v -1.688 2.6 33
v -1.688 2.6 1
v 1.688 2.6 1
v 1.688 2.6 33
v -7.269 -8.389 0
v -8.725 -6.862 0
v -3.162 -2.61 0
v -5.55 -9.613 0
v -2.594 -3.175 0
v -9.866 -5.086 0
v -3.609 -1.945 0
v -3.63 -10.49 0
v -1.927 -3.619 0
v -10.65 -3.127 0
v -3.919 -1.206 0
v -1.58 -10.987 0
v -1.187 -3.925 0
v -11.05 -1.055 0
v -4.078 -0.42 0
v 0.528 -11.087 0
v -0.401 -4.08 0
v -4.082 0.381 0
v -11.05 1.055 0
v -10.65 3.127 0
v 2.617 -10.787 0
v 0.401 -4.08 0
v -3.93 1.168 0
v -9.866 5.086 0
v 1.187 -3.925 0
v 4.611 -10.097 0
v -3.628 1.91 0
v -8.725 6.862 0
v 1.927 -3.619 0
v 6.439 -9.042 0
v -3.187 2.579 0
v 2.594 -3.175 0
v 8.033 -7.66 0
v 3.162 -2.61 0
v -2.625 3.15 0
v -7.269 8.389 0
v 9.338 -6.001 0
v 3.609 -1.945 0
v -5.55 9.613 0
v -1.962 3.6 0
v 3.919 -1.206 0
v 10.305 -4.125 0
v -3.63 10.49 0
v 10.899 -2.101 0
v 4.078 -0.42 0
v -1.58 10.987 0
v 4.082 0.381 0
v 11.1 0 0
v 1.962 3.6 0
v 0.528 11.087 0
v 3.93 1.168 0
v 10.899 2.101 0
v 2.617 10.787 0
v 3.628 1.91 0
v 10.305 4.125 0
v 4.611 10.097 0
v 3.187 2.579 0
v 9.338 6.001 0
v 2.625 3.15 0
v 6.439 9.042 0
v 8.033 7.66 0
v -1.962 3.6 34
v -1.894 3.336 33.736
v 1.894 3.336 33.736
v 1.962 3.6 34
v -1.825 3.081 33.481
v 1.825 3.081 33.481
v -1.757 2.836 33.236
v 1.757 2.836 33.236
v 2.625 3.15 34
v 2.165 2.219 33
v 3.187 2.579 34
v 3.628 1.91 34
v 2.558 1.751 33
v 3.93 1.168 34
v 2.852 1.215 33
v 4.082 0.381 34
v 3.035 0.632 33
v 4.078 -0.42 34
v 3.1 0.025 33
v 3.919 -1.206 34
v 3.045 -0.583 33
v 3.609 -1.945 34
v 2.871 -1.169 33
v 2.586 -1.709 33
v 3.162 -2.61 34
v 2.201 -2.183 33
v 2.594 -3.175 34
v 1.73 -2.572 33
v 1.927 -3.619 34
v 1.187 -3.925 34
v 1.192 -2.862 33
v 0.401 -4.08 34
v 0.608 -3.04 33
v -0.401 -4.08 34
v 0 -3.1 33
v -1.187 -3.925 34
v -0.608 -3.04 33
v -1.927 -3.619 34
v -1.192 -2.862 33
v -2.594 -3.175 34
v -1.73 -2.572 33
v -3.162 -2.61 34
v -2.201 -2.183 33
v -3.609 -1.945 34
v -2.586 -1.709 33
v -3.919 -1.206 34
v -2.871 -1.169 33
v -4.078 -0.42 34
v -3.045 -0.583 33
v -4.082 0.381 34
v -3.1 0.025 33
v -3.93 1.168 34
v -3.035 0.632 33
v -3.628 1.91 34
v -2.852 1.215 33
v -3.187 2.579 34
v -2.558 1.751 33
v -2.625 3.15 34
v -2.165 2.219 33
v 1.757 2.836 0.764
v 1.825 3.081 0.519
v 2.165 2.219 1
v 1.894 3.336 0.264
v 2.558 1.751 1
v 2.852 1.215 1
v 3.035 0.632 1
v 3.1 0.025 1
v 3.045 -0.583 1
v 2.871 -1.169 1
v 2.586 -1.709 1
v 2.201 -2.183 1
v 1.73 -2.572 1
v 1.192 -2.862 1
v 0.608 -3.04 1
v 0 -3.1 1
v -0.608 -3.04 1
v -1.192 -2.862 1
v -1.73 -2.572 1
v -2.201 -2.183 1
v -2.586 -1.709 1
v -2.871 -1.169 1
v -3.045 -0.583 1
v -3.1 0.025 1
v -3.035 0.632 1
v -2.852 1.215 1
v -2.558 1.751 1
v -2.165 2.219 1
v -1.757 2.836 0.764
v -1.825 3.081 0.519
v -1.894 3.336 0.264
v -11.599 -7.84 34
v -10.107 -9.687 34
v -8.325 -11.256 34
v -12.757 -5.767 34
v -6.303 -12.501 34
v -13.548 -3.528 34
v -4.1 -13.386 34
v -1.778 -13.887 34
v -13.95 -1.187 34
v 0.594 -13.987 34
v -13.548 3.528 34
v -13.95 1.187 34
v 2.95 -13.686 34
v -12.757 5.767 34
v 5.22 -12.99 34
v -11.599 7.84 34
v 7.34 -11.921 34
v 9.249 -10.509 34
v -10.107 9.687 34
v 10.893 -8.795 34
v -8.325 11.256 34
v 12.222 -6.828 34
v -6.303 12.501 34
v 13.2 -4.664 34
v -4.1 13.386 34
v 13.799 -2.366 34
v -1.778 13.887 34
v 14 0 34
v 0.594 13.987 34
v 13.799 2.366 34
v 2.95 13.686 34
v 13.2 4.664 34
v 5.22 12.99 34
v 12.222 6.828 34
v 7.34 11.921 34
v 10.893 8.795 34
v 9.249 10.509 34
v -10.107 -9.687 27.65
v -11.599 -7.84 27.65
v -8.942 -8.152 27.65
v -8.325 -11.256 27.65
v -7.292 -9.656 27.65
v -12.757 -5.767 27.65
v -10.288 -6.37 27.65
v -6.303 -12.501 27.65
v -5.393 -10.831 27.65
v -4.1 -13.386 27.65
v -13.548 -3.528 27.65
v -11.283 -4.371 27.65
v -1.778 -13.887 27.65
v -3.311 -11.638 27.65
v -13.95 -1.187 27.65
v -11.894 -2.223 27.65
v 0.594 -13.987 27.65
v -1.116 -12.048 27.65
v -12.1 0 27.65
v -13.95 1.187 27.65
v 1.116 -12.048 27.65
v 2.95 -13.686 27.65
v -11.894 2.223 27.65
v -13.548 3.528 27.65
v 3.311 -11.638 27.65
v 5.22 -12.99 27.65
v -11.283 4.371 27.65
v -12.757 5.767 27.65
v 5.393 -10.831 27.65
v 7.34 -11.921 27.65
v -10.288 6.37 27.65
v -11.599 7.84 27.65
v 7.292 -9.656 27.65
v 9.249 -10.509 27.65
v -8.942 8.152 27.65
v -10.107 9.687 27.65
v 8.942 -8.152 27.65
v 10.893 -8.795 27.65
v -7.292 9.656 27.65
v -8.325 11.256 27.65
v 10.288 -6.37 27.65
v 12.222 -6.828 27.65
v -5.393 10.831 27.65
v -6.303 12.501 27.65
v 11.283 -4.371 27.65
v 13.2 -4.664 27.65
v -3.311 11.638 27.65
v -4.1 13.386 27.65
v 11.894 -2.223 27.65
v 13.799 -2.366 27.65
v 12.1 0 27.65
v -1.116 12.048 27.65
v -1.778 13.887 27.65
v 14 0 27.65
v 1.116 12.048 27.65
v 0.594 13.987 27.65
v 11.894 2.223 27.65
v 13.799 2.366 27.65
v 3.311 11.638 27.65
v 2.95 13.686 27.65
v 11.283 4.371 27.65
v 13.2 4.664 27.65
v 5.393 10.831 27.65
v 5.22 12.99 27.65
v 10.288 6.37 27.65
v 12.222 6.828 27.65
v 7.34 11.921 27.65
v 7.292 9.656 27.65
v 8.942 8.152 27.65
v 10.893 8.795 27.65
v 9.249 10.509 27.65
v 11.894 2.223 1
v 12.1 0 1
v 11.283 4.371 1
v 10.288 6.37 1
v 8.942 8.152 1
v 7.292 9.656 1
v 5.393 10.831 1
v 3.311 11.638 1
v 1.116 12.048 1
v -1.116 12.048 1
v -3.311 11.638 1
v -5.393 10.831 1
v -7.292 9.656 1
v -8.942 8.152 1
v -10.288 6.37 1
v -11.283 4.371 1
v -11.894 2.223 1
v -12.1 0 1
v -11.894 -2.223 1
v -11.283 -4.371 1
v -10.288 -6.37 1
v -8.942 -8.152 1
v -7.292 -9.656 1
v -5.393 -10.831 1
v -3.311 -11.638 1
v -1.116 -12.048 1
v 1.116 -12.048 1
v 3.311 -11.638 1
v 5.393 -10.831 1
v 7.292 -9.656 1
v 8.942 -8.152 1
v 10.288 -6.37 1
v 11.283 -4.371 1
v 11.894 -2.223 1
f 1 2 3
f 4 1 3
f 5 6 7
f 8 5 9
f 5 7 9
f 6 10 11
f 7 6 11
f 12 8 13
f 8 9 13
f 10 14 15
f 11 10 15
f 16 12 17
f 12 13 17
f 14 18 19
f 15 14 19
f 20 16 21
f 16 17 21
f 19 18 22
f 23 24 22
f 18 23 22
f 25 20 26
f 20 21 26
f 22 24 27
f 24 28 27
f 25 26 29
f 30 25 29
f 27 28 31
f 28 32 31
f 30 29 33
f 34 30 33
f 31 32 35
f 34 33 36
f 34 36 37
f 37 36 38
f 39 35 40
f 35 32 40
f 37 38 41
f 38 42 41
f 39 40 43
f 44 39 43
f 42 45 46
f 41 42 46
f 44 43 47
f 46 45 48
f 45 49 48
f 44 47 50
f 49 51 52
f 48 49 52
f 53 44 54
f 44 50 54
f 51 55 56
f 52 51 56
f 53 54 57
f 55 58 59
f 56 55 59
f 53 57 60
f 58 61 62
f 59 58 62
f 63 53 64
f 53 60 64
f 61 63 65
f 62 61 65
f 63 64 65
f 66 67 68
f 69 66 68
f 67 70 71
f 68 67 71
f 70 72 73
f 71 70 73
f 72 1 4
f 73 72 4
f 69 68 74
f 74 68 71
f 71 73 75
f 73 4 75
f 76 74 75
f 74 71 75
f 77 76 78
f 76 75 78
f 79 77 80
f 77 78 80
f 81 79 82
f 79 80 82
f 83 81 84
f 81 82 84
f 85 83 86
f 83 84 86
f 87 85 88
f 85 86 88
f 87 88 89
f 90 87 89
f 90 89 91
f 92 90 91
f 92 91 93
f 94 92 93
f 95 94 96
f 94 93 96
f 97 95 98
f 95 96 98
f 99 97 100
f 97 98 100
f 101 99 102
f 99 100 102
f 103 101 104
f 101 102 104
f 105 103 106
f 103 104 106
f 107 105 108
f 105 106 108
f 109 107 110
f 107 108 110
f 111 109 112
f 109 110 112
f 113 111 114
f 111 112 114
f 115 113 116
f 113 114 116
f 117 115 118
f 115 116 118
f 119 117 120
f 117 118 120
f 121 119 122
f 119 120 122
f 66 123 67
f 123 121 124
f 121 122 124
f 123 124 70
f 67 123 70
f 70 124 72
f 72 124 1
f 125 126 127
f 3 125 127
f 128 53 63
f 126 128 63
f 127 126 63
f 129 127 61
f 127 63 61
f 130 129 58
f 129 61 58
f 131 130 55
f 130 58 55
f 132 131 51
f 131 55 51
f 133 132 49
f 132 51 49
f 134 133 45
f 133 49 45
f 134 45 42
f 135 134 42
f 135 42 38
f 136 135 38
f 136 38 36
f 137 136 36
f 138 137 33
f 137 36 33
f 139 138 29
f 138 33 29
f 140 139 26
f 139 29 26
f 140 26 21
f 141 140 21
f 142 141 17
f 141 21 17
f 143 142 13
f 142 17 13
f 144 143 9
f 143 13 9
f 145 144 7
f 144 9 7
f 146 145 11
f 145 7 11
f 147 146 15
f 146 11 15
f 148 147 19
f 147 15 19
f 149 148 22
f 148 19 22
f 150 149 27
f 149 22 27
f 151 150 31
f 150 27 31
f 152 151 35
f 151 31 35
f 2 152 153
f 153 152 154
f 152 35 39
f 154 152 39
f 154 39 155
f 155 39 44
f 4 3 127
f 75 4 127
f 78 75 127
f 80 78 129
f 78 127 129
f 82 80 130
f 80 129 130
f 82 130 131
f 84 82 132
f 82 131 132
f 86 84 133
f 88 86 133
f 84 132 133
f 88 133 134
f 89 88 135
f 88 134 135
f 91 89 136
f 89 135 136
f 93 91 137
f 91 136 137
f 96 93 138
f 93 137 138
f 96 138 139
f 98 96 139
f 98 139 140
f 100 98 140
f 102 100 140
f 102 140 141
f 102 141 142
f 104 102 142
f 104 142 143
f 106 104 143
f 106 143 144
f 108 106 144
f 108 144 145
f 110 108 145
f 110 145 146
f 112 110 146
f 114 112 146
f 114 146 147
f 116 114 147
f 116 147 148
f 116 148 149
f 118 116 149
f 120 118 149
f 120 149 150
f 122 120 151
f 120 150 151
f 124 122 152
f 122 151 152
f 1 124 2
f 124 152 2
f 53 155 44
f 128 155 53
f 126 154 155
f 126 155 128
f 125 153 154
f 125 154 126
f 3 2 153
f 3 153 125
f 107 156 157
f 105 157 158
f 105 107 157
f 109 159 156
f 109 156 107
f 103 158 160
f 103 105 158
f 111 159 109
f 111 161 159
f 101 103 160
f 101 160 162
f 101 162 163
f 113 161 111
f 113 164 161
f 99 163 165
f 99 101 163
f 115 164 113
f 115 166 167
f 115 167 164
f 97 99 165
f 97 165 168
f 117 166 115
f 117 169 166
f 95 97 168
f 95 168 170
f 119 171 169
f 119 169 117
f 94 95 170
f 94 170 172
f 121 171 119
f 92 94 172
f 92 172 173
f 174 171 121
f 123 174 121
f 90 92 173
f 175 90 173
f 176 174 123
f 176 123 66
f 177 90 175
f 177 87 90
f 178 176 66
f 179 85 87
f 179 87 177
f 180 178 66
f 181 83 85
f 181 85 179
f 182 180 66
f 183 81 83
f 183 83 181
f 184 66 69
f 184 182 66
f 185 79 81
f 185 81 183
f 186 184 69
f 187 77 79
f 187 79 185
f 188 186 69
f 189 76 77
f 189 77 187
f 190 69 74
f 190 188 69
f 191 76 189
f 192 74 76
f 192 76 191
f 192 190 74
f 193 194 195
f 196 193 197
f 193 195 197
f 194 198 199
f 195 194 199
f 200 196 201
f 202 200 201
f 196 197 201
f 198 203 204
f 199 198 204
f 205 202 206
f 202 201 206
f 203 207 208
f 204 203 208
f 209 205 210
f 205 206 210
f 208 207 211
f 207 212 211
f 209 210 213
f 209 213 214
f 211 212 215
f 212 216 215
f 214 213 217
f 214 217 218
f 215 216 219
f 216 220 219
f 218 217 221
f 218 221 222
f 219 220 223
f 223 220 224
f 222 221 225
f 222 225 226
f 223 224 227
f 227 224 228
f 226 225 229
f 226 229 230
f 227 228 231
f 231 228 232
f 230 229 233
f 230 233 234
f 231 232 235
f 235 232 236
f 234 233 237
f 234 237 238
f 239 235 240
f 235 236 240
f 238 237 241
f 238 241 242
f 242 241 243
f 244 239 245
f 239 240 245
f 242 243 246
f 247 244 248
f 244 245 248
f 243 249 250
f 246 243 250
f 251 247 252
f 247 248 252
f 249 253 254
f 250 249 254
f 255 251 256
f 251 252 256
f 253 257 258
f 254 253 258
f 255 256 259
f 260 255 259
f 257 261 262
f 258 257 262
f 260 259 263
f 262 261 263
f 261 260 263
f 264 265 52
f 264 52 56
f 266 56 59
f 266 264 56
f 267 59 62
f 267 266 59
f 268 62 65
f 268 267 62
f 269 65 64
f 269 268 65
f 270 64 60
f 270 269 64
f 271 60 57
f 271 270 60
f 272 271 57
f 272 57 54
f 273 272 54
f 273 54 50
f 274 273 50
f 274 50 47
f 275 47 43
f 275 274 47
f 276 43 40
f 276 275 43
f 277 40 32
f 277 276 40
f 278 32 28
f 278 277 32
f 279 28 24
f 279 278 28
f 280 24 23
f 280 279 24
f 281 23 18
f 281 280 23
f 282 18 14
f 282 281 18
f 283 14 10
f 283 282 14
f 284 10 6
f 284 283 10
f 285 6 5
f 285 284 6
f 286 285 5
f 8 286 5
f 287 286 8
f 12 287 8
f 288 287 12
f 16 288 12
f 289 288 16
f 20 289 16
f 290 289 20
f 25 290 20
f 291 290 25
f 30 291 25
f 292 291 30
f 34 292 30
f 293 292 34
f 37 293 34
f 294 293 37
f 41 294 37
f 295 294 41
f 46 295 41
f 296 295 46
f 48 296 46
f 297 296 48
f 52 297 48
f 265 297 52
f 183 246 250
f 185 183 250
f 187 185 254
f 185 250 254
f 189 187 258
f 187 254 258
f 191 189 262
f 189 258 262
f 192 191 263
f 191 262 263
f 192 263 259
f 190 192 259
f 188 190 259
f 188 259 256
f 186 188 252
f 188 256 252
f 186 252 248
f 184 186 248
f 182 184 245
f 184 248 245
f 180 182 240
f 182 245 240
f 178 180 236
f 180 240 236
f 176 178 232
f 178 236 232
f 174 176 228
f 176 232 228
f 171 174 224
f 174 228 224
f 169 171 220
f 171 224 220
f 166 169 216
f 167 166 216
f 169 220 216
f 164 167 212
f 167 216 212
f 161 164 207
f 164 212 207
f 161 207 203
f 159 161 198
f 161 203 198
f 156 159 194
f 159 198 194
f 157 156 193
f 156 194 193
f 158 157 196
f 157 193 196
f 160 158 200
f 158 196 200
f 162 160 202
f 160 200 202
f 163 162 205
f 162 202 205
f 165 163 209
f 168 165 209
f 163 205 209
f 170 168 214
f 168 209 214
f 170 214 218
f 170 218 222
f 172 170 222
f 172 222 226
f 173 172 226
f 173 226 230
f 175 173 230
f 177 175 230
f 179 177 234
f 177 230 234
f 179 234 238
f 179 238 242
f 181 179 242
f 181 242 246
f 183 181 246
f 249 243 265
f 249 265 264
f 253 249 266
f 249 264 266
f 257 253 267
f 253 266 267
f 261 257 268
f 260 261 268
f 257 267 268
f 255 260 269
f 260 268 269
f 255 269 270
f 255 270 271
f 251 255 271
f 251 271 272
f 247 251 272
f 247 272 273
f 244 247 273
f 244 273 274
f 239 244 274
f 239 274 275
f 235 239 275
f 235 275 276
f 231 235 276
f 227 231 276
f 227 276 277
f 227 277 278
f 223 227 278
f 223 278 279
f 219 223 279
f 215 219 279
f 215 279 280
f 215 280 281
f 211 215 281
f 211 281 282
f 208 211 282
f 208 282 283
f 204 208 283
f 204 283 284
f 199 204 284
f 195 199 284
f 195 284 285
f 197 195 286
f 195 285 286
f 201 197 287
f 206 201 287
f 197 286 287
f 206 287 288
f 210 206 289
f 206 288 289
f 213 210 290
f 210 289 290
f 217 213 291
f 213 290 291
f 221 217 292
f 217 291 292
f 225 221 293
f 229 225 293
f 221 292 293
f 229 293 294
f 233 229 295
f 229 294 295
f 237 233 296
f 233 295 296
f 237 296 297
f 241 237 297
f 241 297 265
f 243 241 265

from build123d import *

# Parameters (mm, degrees)
SKETCH2_R           = 12.1
BOSS_EXTRUDE1_DEPTH = 34
BOSS_EXTRUDE2_START = -6.35
SKETCH3_R           = 14
SKETCH3_R_2         = 12.1
BOSS_EXTRUDE2_DEPTH = 6.35
CHAMFER1_SIZE       = 1


with BuildPart() as part:
    # Sketch2 → Boss-Extrude1 (new body)
    with BuildSketch(Plane.XY):
        Circle(SKETCH2_R)
        with BuildLine():
            Line((-1.688194302, 2.6), (1.688194302, 2.6))
            ThreePointArc((1.688194302, 2.6), (0, -3.1), (-1.688194302, 2.6))
        make_face(mode=Mode.SUBTRACT)
    extrude(amount=BOSS_EXTRUDE1_DEPTH)

    # Sketch3 → Boss-Extrude2 (add)
    # profile 1 of 2: a face of its own
    with BuildSketch(Plane.XY.offset(34).offset(BOSS_EXTRUDE2_START)):
        Circle(SKETCH3_R)
        Circle(SKETCH3_R_2, mode=Mode.SUBTRACT)
    # profile 2 of 2: a face of its own
    with BuildSketch(Plane.XY.offset(34).offset(BOSS_EXTRUDE2_START)):
        Circle(SKETCH3_R_2)
        with BuildLine():
            Line((-1.688194302, 2.6), (1.688194302, 2.6))
            ThreePointArc((1.688194302, 2.6), (0, -3.1), (-1.688194302, 2.6))
        make_face(mode=Mode.SUBTRACT)
    extrude(amount=BOSS_EXTRUDE2_DEPTH)

    # Chamfer1
    chamfer1_edges = [part.edges().sort_by_distance(p)[0] for p in [
        (0, 2.6, 34),
        (-12.1, 0, 0),
        (0, 2.6, 0),
        (0, -3.1, 0),
        (0, -3.1, 34),
    ]]
    chamfer(chamfer1_edges, length=CHAMFER1_SIZE)


solid = part.part
